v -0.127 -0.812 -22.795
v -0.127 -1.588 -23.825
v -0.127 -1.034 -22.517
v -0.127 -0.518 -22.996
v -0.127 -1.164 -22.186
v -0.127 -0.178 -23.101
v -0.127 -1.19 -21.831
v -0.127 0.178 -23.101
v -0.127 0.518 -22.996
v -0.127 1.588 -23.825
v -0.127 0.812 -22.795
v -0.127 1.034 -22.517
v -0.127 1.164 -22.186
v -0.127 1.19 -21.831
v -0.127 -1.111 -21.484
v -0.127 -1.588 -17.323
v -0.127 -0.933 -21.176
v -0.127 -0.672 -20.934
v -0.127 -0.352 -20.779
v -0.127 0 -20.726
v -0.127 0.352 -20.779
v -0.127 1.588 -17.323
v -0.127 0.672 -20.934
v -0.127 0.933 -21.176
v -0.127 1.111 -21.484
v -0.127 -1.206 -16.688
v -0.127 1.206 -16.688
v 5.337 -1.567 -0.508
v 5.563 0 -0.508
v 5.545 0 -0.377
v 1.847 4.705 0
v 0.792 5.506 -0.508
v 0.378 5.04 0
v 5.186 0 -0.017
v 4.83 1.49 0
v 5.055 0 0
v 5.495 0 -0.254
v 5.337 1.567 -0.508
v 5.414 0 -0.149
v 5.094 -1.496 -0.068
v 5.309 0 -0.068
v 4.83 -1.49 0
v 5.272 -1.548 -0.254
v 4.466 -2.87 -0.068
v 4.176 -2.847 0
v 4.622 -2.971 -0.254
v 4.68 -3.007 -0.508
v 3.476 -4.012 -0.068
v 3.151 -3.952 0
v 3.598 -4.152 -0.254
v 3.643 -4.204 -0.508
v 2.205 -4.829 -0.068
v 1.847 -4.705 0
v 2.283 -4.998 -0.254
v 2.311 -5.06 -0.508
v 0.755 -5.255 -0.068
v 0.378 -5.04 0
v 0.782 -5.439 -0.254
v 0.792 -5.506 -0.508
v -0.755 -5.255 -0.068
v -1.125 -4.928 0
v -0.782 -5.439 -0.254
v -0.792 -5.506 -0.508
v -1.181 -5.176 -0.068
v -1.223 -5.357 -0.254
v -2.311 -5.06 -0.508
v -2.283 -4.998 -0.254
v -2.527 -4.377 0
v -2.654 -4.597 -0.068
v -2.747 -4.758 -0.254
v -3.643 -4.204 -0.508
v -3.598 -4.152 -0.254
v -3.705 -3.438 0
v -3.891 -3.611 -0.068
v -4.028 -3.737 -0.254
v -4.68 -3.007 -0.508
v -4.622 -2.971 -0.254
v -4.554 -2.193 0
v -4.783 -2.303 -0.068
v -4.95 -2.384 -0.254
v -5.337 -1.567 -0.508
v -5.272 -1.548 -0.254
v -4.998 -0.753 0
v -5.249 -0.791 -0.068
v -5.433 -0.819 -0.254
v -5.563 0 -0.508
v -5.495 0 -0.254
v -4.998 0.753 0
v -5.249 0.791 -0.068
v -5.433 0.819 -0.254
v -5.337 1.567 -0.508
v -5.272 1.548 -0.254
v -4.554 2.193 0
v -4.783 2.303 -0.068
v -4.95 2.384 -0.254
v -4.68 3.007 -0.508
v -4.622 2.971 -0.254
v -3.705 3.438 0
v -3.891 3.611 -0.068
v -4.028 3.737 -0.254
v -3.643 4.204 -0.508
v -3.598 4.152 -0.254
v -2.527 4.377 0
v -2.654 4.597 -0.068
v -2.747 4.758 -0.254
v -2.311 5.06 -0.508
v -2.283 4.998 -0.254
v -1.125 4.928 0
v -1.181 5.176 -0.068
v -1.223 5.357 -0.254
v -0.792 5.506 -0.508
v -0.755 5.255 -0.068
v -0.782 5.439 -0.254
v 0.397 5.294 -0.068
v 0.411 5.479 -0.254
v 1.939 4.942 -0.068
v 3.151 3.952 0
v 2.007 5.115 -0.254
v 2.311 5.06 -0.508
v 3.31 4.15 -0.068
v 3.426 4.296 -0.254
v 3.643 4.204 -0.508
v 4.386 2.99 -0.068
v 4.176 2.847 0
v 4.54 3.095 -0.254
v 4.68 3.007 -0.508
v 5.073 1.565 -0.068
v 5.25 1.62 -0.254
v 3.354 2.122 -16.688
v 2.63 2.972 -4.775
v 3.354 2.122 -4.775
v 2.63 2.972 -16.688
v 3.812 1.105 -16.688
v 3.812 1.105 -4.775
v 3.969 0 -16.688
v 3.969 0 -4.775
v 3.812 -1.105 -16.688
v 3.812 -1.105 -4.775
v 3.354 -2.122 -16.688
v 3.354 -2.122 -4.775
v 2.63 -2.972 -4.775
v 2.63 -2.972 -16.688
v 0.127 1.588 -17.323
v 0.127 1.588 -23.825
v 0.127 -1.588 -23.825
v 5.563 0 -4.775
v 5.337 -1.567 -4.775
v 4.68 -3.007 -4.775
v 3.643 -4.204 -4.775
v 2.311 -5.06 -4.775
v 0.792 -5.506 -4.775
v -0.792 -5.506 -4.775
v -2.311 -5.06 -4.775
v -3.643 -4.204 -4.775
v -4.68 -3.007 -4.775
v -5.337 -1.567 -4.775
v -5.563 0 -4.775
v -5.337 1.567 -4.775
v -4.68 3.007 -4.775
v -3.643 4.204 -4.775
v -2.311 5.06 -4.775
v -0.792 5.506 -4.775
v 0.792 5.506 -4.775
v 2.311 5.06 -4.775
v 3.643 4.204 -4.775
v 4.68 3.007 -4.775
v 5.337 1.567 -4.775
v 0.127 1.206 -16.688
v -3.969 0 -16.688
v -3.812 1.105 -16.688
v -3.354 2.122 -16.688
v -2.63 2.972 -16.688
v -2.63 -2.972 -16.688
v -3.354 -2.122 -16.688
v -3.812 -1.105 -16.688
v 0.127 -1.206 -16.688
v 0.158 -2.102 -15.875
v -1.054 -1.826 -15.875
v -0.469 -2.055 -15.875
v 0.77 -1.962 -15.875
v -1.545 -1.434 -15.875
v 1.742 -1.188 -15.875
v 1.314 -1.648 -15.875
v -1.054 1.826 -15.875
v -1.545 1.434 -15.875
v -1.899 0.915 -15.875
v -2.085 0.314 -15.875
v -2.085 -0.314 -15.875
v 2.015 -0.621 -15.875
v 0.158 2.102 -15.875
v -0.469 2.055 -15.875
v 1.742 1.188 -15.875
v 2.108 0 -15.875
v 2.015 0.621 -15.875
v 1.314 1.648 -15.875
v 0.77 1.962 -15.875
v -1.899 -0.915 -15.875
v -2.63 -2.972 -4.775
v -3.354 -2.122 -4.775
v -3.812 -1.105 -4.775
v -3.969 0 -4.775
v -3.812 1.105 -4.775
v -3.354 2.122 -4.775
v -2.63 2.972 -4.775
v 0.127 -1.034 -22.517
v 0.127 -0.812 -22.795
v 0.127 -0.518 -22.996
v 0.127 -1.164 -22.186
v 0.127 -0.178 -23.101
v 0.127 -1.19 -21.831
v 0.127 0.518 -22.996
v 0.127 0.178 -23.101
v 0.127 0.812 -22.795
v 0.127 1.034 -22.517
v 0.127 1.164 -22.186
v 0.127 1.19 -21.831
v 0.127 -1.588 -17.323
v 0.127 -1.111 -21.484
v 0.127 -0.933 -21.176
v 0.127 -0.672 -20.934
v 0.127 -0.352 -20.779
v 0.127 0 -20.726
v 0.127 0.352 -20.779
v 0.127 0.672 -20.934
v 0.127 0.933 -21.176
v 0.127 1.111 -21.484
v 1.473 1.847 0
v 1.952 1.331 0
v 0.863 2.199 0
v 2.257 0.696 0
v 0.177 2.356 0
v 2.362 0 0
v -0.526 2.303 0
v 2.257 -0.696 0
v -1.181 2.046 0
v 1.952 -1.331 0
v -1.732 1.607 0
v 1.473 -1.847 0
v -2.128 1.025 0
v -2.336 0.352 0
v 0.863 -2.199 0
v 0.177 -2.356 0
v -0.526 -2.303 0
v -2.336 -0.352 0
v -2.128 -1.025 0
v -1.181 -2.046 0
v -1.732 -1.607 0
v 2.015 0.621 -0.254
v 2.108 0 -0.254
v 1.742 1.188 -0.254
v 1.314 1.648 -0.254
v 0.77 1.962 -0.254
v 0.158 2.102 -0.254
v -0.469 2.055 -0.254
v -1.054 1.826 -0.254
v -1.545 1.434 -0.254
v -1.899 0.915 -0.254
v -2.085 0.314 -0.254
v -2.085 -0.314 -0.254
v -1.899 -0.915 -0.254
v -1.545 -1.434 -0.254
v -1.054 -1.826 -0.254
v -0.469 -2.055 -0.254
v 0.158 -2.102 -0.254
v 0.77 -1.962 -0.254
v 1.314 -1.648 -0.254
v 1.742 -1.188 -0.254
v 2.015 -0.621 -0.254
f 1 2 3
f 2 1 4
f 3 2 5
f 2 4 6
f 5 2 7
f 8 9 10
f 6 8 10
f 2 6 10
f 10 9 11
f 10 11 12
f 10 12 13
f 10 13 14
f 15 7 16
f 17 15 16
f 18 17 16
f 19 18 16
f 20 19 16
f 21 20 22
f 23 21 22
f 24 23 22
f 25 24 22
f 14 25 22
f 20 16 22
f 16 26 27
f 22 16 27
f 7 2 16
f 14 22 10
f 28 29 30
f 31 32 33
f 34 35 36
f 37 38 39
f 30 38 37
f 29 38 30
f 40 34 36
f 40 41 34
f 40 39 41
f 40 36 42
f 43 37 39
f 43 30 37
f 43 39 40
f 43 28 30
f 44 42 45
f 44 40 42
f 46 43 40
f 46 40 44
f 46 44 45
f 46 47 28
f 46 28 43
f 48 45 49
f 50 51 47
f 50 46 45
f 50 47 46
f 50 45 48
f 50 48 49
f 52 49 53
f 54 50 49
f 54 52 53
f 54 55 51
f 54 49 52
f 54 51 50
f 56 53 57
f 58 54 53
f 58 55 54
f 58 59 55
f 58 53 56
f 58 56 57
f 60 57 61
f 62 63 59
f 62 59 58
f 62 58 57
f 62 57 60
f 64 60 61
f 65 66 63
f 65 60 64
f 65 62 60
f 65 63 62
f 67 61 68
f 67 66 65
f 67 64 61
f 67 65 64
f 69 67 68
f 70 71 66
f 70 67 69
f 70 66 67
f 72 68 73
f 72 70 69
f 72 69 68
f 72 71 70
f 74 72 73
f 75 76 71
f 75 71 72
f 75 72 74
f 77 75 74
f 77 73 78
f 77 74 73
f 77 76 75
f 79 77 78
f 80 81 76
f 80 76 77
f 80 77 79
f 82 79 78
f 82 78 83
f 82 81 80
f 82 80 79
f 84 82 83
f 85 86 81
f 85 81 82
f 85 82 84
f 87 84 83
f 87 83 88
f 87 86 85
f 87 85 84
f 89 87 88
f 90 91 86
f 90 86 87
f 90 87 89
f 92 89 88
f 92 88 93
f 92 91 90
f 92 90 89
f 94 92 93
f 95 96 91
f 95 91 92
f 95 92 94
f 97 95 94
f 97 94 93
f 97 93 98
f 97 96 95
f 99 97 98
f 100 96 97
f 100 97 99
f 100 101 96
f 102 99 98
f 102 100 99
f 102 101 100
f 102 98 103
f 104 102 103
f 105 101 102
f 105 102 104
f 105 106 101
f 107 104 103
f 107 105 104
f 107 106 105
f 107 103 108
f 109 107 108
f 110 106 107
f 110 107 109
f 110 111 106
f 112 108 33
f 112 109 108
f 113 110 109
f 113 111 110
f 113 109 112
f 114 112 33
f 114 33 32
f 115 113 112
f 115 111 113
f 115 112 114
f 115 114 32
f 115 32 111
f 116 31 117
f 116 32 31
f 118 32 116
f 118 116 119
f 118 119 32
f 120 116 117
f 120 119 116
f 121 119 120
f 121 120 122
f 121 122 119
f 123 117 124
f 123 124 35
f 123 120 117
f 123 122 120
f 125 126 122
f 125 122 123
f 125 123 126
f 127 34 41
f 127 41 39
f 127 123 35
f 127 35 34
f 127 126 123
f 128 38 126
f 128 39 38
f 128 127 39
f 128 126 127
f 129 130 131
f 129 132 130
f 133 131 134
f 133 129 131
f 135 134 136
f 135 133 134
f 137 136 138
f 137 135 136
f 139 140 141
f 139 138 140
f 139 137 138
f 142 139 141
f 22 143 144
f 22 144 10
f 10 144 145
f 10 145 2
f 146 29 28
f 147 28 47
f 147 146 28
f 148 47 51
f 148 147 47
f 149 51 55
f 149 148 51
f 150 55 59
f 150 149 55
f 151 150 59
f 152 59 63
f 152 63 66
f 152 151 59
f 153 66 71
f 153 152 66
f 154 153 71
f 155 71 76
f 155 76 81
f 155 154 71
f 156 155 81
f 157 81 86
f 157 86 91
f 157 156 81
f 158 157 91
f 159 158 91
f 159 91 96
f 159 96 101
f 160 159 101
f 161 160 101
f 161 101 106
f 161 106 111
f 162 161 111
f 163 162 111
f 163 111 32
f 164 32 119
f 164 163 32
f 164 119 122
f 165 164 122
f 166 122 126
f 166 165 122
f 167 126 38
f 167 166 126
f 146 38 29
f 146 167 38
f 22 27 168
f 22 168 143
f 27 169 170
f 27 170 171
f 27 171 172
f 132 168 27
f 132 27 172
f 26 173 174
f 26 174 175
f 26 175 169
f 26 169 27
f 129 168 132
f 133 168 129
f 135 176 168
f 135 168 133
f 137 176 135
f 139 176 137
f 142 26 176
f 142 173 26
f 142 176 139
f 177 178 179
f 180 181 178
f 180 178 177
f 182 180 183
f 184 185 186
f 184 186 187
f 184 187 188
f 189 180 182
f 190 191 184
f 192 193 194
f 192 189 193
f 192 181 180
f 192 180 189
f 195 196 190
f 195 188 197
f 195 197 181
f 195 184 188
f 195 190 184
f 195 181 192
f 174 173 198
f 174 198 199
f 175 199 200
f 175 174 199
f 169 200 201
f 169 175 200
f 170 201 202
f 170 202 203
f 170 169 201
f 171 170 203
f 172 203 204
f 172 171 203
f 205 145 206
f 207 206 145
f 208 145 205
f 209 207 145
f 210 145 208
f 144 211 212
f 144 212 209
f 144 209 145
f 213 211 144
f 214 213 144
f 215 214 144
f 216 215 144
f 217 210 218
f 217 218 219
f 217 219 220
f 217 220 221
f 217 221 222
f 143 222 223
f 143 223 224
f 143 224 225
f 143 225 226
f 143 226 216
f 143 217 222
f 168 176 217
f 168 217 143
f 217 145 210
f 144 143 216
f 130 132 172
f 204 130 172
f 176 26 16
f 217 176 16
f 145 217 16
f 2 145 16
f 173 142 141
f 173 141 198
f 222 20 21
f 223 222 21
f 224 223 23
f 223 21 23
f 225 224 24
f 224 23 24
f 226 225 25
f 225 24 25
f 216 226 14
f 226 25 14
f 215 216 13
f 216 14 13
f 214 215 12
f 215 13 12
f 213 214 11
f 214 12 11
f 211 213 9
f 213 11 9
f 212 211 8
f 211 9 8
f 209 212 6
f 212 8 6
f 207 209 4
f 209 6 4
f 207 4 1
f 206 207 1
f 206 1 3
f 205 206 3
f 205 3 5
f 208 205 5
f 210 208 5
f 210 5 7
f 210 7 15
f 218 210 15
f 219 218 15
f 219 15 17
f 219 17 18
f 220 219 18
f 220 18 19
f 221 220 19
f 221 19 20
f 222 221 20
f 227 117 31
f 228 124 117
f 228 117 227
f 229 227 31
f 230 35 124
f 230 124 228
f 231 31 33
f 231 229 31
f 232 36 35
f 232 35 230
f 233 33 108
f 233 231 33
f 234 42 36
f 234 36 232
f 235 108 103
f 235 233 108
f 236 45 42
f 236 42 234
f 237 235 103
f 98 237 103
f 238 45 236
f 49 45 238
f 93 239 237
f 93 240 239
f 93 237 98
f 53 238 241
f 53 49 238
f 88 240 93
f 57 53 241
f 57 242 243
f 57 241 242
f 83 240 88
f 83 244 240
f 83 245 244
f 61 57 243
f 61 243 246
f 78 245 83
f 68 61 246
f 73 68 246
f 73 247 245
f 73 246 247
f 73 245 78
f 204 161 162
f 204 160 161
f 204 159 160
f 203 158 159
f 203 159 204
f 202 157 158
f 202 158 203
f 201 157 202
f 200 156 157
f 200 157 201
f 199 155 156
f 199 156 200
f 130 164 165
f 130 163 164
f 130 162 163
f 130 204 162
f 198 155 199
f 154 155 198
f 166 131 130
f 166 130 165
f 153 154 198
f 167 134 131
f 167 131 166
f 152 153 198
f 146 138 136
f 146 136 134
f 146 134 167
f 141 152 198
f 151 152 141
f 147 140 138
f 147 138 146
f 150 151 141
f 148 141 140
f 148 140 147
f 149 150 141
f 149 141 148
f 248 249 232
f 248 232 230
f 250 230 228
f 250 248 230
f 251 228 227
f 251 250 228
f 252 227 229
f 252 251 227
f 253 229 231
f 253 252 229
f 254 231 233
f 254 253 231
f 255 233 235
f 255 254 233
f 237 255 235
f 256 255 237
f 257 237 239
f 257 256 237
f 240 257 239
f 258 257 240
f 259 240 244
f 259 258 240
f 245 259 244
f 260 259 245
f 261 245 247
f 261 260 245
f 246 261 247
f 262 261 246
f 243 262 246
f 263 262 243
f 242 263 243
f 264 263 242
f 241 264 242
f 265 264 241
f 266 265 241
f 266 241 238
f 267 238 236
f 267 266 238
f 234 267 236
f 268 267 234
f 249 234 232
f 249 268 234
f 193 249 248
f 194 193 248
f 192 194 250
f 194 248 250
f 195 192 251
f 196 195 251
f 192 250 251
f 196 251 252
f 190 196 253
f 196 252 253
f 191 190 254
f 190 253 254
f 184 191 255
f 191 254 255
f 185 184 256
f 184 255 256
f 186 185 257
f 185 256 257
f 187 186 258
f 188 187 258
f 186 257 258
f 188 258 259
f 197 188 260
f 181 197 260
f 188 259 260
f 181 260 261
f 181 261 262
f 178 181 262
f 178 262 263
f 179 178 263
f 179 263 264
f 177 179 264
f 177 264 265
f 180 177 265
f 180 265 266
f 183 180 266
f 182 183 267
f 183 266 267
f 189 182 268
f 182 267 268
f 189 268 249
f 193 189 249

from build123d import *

# Parameters (mm, degrees)
FILLET1_R           = 0.508
SKETCH2_OUTSIDE_W   = 17.714
SKETCH2_OUTSIDE_H   = 17.714
SKETCH2_OUTSIDE_W_2 = 9.40445076
SKETCH2_OUTSIDE_H_2 = 5.9436
CUT_EXTRUDE1_DEPTH  = 11.9126
SKETCH3_W           = 0.254
SKETCH3_H           = 3.175
BOSS_EXTRUDE1_DEPTH = 7.1374
SKETCH4_R           = 1.1938
CUT_EXTRUDE2_DEPTH  = 7.1374
CUT_EXTRUDE3_DEPTH  = 7.1374
SKETCH7_R           = 2.1082
CUT_EXTRUDE4_DEPTH  = 15.875
CHAMFER2_SIZE       = 0.254


with BuildPart() as part:
    # Sketch1 → Revolve1 (revolve)
    with BuildSketch(Plane(origin=(0, 0, 0), x_dir=(0, 0, -1), z_dir=(1, 0, 0)), mode=Mode.PRIVATE) as revolve1_sk:
        Polygon((0, 0), (0, 5.5626), (4.7752, 5.5626), (4.7752, 3.96875), (16.6878, 3.96875), (16.6878, 0), align=None)
    revolve(revolve1_sk.sketch.rotate(Axis((0, 0, 0), (0, 0, -1)), 90), axis=Axis((0, 0, 0), (0, 0, -1)))  # turned: the seam where the file's is

    # Fillet1
    fillet1_edges = [part.edges().sort_by_distance(p)[0] for p in [
        (-5.5626, 0, 0),
    ]]
    fillet(fillet1_edges, radius=FILLET1_R)

    # Sketch2 outside → Cut-Extrude1 (cut)
    with BuildSketch(Plane(origin=(0, 0, -16.6878), x_dir=(-1, 0, 0), z_dir=(0, 0, -1))):
        Rectangle(SKETCH2_OUTSIDE_W, SKETCH2_OUTSIDE_H)
        Rectangle(SKETCH2_OUTSIDE_W_2, SKETCH2_OUTSIDE_H_2, mode=Mode.SUBTRACT)
    extrude(amount=-CUT_EXTRUDE1_DEPTH, mode=Mode.SUBTRACT)

    # Sketch3 → Boss-Extrude1 (add)
    with BuildSketch(Plane(origin=(0, 0, -16.6878), x_dir=(-1, 0, 0), z_dir=(0, 0, -1))):
        Rectangle(SKETCH3_W, SKETCH3_H)
    extrude(amount=BOSS_EXTRUDE1_DEPTH)

    # Sketch4 → Cut-Extrude2 (cut)
    with BuildSketch(Plane.ZY.offset(0.127)):
        with Locations((-21.9202, 0)):
            Circle(SKETCH4_R)
    extrude(amount=-CUT_EXTRUDE2_DEPTH, mode=Mode.SUBTRACT)

    # Sketch5 → Cut-Extrude3 (cut)
    with BuildSketch(Plane.ZY.offset(0.127)):
        Polygon((-16.6878, 1.5875), (-16.6878, 1.2065), (-17.3228, 1.5875), align=None)
        Polygon((-16.6878, -1.2065), (-17.3228, -1.5875), (-16.6878, -1.5875), align=None)
    extrude(amount=-CUT_EXTRUDE3_DEPTH, mode=Mode.SUBTRACT)

    # Sketch7 → Cut-Extrude4 (cut)
    with BuildSketch(Plane.XY):
        Circle(SKETCH7_R)
    extrude(amount=-CUT_EXTRUDE4_DEPTH, mode=Mode.SUBTRACT)

    # Chamfer2
    chamfer2_edges = [part.edges().sort_by_distance(p)[0] for p in [
        (-2.1082, 0, 0),
    ]]
    chamfer(chamfer2_edges, length=CHAMFER2_SIZE)


solid = part.part
